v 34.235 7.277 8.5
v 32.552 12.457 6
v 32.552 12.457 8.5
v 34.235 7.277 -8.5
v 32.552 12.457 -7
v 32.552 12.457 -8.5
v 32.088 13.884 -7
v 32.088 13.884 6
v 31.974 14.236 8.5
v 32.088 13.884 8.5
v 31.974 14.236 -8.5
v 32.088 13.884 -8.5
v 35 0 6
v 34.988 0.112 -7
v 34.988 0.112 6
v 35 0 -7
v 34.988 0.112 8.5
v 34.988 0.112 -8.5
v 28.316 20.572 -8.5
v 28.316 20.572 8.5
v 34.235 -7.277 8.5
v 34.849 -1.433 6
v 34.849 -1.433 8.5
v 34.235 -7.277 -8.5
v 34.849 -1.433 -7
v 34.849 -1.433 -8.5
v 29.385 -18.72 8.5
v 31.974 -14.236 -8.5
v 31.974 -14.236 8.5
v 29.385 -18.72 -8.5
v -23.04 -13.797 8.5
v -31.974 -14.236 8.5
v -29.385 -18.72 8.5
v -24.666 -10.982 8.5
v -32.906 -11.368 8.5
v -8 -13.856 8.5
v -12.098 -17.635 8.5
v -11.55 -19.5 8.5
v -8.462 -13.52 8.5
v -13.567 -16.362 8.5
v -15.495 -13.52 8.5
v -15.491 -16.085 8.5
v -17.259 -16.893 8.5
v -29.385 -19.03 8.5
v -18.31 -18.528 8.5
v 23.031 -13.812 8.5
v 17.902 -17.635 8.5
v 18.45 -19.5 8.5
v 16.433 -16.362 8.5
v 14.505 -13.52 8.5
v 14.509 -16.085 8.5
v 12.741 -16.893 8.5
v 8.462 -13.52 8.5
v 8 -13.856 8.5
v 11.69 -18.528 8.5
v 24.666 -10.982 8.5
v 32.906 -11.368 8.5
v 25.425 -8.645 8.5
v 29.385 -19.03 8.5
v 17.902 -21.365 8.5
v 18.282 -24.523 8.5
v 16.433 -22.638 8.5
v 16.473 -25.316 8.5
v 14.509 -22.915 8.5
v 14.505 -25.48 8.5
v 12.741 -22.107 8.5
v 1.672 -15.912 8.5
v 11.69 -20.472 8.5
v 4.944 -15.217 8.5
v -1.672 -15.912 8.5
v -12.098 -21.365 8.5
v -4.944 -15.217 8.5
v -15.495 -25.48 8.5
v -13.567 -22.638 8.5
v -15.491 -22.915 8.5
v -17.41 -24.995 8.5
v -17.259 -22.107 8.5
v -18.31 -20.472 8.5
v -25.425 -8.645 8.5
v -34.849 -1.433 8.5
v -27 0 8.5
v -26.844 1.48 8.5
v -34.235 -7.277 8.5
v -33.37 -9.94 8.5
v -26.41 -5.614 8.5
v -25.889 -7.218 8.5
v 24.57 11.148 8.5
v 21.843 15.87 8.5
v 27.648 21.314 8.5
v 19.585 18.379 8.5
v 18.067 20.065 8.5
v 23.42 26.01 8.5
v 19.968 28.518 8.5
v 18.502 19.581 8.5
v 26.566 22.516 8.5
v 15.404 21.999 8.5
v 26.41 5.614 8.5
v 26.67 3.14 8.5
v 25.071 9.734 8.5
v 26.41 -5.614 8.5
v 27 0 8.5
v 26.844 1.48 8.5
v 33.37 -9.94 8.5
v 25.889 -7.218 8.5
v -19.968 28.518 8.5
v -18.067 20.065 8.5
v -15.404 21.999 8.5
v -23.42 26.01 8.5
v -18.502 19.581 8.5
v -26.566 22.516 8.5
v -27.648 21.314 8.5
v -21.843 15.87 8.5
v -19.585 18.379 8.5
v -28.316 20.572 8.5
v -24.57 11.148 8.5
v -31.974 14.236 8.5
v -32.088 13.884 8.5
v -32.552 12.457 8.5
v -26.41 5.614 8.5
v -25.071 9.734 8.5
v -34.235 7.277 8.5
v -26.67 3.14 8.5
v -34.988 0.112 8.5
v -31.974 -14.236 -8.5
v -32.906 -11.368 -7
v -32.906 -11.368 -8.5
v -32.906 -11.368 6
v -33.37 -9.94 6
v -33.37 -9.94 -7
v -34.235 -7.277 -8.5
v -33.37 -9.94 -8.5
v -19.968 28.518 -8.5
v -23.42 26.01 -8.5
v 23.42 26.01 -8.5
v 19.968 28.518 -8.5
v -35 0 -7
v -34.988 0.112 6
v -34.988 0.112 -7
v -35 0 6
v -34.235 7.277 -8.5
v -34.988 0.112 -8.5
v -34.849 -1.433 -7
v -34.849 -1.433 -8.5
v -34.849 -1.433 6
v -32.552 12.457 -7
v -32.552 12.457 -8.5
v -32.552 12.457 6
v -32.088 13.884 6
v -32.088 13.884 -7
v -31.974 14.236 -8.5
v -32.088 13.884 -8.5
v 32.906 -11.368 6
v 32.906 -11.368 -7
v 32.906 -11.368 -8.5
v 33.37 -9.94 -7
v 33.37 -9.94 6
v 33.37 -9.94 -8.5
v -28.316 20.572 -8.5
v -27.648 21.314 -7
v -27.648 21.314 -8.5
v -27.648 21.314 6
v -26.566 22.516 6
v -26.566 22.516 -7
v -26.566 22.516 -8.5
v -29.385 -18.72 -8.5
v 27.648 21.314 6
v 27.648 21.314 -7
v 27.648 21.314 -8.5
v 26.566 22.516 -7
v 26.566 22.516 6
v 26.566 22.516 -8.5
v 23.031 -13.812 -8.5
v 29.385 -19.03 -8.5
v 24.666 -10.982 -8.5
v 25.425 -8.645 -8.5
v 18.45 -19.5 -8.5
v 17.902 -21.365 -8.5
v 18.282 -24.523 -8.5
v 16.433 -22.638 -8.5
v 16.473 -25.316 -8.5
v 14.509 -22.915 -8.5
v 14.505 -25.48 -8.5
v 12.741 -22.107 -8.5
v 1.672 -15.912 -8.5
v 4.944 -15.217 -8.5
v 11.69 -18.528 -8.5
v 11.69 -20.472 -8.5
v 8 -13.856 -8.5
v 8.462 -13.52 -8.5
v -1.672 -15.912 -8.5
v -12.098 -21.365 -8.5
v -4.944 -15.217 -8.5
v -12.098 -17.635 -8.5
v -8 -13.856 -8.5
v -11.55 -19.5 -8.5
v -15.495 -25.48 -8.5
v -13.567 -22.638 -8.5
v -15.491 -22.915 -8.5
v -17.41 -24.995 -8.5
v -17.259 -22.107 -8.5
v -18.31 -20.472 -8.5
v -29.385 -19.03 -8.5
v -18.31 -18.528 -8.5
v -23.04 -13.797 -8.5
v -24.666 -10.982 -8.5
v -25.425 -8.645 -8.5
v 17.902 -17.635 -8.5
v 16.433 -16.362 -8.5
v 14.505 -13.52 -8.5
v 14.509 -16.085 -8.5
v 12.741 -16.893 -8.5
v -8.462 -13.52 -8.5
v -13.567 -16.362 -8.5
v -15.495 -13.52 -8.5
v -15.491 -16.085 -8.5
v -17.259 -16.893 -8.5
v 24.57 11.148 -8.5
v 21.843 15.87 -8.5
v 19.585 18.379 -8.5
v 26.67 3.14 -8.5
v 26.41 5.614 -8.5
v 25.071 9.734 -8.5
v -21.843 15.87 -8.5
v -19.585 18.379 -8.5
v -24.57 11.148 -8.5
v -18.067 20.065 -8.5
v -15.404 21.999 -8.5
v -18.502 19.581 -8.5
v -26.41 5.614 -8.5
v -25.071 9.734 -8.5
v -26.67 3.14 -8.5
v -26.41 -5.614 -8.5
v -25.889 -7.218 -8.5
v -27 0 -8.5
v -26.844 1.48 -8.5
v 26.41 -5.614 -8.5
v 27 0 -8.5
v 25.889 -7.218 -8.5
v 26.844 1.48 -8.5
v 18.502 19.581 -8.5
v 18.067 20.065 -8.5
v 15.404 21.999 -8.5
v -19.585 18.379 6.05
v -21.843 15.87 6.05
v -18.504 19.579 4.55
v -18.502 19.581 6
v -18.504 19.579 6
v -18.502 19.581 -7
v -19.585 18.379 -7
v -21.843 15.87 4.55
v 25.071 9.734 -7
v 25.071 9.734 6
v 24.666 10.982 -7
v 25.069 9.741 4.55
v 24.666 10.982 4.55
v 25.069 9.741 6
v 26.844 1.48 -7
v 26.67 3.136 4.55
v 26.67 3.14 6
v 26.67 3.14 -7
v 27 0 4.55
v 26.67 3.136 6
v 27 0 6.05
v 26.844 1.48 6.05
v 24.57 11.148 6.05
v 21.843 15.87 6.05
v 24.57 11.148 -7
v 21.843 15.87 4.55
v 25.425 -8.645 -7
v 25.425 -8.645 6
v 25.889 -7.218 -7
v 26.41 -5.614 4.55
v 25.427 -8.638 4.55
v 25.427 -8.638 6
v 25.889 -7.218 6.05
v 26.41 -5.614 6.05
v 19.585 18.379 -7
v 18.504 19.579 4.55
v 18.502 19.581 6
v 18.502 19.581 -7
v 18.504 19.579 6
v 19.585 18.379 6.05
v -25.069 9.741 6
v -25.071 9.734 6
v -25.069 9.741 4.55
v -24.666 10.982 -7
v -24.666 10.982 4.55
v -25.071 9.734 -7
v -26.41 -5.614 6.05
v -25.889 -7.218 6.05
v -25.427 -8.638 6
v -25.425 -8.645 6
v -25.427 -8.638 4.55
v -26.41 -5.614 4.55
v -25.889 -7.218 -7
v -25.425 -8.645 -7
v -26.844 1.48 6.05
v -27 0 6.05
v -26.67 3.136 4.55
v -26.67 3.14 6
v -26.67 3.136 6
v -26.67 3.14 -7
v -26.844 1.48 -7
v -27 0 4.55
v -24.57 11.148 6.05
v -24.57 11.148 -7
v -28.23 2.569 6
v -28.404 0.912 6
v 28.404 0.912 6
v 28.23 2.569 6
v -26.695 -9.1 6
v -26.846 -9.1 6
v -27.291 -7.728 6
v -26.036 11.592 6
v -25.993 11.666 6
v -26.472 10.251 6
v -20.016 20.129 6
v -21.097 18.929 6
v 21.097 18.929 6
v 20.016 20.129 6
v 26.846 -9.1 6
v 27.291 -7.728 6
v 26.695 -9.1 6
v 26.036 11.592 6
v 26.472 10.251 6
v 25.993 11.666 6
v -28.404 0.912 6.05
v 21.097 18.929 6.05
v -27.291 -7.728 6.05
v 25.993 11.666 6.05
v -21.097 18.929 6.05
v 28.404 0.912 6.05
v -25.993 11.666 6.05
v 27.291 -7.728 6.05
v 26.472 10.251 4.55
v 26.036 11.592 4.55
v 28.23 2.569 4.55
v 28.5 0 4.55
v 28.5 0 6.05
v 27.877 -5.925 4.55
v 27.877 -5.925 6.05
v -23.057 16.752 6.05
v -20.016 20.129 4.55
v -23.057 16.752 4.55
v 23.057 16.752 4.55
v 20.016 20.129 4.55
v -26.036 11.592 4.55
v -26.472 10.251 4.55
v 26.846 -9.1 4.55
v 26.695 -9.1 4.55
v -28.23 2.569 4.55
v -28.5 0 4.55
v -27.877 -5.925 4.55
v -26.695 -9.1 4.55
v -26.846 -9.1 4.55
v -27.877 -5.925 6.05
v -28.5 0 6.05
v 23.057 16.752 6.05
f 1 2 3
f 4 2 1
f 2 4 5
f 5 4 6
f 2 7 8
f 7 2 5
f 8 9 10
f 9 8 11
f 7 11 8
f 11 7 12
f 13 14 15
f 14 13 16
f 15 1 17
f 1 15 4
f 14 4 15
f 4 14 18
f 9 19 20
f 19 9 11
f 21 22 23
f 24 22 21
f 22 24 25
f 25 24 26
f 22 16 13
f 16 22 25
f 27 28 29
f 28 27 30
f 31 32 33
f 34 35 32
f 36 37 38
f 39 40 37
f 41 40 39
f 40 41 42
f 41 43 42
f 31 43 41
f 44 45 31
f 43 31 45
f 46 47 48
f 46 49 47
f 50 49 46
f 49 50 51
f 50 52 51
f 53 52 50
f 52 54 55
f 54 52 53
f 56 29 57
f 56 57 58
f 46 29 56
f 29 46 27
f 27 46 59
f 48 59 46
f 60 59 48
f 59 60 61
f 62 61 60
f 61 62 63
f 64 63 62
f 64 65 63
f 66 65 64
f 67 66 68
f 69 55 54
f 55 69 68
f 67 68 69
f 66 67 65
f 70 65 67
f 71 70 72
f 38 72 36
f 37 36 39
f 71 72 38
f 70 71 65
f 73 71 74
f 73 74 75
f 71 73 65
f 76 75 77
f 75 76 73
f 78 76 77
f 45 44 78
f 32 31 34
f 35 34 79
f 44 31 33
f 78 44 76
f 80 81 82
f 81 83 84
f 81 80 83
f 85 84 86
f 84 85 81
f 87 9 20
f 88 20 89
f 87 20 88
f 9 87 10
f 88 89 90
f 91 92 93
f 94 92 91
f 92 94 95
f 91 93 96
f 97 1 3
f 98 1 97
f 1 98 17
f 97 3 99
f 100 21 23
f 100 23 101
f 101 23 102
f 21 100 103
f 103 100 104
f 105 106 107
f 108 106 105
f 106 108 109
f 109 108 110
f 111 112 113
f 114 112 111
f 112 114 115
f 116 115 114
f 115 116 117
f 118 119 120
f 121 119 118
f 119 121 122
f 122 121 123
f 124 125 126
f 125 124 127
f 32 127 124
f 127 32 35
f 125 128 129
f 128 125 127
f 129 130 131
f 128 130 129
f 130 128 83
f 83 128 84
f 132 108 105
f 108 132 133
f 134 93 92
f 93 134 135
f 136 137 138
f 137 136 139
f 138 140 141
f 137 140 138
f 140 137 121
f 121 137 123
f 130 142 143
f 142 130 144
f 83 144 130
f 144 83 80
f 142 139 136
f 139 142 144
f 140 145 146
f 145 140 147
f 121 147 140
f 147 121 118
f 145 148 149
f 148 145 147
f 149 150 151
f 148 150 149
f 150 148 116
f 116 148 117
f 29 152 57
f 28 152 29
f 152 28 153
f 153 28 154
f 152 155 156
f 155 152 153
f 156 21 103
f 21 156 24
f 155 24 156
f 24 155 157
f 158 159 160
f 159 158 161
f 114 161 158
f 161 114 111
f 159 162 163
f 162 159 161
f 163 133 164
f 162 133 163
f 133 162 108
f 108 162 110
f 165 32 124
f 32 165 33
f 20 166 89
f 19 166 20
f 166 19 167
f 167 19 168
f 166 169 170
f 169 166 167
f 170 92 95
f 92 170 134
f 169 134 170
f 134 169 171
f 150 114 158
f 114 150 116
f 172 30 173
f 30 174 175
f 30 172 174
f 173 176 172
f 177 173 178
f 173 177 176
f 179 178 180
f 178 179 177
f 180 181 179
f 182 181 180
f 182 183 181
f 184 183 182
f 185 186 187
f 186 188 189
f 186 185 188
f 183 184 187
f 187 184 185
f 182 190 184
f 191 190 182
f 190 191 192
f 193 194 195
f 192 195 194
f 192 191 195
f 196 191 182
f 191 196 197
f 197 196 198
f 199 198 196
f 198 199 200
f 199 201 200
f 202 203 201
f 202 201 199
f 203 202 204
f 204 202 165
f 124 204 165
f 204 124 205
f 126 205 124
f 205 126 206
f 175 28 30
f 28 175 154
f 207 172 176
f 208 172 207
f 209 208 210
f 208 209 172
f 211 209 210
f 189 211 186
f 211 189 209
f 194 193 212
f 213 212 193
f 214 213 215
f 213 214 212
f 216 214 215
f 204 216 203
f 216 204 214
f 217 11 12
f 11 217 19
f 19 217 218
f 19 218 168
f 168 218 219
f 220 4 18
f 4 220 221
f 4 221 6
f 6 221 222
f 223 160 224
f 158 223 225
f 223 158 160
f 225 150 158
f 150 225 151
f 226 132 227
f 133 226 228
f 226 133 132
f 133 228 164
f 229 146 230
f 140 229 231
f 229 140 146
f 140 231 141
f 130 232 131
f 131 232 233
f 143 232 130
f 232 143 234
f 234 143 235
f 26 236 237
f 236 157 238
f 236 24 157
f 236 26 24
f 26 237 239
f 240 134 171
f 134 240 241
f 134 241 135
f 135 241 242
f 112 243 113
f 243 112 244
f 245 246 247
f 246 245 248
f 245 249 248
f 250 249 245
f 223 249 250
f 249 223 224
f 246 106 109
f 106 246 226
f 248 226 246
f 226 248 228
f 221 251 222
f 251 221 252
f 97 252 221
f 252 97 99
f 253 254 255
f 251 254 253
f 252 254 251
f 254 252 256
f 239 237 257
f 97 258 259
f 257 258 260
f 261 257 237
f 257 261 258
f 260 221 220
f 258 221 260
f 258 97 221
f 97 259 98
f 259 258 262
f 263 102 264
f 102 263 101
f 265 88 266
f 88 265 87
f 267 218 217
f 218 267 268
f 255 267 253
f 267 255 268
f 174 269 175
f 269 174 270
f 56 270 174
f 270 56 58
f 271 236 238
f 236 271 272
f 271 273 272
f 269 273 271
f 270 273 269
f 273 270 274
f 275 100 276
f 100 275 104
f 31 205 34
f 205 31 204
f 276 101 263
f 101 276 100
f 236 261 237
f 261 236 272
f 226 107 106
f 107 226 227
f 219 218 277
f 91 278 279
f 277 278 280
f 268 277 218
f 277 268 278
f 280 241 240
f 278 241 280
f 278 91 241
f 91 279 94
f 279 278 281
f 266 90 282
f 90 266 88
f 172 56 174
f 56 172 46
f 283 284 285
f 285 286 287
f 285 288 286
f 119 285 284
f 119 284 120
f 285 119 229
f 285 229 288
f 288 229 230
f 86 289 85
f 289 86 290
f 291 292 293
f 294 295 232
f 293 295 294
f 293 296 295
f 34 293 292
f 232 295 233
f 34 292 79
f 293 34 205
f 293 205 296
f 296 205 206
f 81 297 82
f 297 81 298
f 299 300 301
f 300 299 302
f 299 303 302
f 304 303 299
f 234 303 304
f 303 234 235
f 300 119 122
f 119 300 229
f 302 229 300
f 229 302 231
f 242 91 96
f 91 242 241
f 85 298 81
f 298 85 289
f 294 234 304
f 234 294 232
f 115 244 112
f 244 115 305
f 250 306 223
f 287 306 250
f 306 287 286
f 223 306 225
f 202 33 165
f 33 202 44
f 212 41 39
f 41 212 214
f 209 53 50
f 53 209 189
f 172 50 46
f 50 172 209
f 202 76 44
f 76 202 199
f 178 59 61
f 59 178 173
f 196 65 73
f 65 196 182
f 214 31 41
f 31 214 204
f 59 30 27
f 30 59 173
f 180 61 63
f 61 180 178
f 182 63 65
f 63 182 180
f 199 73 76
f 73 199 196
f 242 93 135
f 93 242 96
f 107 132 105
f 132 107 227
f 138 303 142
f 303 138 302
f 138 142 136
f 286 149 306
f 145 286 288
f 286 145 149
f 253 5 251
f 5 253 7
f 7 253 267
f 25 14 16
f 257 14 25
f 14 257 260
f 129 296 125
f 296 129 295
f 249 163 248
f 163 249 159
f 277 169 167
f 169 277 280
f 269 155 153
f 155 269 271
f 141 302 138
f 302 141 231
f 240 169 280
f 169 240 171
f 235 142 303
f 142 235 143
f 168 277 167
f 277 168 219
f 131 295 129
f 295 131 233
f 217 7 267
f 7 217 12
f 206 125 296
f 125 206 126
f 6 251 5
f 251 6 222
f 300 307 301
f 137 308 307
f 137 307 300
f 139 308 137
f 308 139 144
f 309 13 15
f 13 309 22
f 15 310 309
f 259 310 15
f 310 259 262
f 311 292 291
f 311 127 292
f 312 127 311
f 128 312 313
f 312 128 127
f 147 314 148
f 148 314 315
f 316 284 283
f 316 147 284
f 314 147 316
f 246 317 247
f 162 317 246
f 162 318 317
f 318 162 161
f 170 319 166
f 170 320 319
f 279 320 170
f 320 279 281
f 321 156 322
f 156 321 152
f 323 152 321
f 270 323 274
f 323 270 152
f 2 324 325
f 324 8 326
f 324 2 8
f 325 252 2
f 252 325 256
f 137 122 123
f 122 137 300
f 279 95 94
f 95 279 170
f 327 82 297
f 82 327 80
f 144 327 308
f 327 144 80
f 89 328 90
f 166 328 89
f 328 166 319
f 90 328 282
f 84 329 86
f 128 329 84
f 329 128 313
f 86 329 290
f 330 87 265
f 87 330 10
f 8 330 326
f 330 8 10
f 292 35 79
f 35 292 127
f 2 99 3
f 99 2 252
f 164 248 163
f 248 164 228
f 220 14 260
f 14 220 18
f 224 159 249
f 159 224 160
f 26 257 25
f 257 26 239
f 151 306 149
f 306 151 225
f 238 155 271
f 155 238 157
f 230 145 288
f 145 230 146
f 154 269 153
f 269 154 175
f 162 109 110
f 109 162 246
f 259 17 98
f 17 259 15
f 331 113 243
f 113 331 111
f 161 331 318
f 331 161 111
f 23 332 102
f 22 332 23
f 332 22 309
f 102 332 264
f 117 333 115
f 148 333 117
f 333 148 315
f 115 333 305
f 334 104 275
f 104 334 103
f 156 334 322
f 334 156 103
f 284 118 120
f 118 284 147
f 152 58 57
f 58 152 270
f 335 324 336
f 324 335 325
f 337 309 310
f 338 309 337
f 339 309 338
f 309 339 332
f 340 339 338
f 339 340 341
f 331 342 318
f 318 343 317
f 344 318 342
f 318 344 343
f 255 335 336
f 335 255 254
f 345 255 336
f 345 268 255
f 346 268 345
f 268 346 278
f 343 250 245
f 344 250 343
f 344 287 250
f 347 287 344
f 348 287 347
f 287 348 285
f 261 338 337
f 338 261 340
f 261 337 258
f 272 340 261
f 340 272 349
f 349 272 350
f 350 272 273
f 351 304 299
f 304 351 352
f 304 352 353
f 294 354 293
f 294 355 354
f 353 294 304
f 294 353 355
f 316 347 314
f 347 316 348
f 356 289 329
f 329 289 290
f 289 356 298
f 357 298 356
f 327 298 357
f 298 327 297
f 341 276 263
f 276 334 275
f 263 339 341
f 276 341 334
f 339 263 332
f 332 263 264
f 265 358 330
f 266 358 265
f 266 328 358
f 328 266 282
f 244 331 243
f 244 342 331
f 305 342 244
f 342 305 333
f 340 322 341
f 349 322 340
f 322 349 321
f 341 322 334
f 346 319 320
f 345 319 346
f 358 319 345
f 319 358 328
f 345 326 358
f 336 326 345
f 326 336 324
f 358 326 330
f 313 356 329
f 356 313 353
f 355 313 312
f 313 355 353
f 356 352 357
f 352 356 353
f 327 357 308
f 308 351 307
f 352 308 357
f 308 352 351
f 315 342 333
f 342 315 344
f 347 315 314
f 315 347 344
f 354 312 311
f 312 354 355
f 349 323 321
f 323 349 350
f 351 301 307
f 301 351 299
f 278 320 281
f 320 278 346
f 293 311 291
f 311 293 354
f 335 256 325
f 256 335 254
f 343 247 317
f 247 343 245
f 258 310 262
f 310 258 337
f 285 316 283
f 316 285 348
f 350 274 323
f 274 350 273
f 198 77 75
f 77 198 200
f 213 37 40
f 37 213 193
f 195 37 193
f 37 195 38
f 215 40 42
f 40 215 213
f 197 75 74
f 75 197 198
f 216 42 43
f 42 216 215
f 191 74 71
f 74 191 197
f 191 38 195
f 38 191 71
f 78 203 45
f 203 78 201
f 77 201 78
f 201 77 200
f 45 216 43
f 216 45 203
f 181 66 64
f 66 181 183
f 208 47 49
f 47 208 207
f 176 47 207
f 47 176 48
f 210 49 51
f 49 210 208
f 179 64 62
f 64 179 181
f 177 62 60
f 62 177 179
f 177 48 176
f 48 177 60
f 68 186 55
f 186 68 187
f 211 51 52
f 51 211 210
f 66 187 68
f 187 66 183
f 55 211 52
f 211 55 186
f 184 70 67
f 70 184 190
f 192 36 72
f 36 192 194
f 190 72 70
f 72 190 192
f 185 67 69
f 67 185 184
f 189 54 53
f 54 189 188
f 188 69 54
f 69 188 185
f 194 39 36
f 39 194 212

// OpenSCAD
use <MCAD/triangles.scad>

//$fa=0.01;
//$fs=0.5;

pinHole=-19.5;

ringw=17;
angle=70;

module nt55() {
	cylinder(r=10,h=145,center=true);
}

module se2a() {
	cylinder(r=11,h=162,center=true);
}

module ring() {
	difference() {
		union() {
			difference() {
				cylinder(r=35,h=ringw,center=true);
				cylinder(r=27,h=ringw+2,center=true);
				translate([0,-29,0]) {
					cube([72,20,ringw+2],center=true);
				}
			}
			hull() {
				translate([-15,pinHole,0])
				cylinder(r=6,h=ringw,center=true);
				translate([15,pinHole,0])
				cylinder(r=6,h=ringw,center=true);
	
				translate([0,-16.53,0]) {
					cube([58.77,5,ringw],center=true);
				}
			}	
		}
	}
}

module innerNotches() {
	translate([0,0,(ringw/2)-3.2])
	intersection() {
		difference() {
			cylinder(r=28.5,h=1.5,center=true);
			
			cylinder(r=26.5,h=2.5,center=true);
		
			translate([0,-19.1,0]) {
				cube([58.5,20,ringw],center=true);
			}
		}
		
		translate([0,6.73,0]) {
			rotate([0,0,20])
			cube([75,11.49,1.5],center=true);
			rotate([0,0,-20])
			cube([75,11.49,1.5],center=true);
		}
	}
}

module notchset() {
		union() {
			translate([0,5,-1])
				cube([75,1.5,3],center=true);
			translate([0,-5,-1])
				cube([75,1.5,3],center=true);
			
			translate([0,0,-ringw])
			union() {
				translate([0,5,0])
				cube([75,1.5,3],center=true);
				translate([0,-5,0])
				cube([75,1.5,3],center=true);
			}
		}
}

module notches() {		
	translate([0,0,ringw/2]) {
		translate([-2,6,0])
		rotate([0,0,20])
		notchset(); 
	
		translate([2,6,0])
		rotate([0,0,-20])
		notchset();
	}
}

module topNotch() {
	union() {
		translate([0,40,-((ringw/2)+ringw/4)])
		rotate([0,0,-90])
			a_triangle(angle/2,40,ringw*1.5);
		
		translate([0,40,((ringw/2)+ringw/4)])
		rotate([0,180,-270])
			a_triangle(angle/2,40,ringw*1.5);		
		
		translate([0,31,0])
			cube([1,10,ringw],center=true);
	}
}

module shockMountEnd() {
	difference() {
		ring();
		topNotch();
		notches();
		color("red")
			innerNotches();
		translate([-15,pinHole,0])
		cylinder(r=3.45,h=ringw*1.5,center=true);
		translate([15,pinHole,0])
		cylinder(r=3.45,h=ringw*1.5,center=true);
		cylinder(r=16,h=ringw*1.5,center=true);
	}
}


//translate([0,0,-5])
//cube(11);

//translate([0,0,0])
//nt55();

shockMountEnd();
